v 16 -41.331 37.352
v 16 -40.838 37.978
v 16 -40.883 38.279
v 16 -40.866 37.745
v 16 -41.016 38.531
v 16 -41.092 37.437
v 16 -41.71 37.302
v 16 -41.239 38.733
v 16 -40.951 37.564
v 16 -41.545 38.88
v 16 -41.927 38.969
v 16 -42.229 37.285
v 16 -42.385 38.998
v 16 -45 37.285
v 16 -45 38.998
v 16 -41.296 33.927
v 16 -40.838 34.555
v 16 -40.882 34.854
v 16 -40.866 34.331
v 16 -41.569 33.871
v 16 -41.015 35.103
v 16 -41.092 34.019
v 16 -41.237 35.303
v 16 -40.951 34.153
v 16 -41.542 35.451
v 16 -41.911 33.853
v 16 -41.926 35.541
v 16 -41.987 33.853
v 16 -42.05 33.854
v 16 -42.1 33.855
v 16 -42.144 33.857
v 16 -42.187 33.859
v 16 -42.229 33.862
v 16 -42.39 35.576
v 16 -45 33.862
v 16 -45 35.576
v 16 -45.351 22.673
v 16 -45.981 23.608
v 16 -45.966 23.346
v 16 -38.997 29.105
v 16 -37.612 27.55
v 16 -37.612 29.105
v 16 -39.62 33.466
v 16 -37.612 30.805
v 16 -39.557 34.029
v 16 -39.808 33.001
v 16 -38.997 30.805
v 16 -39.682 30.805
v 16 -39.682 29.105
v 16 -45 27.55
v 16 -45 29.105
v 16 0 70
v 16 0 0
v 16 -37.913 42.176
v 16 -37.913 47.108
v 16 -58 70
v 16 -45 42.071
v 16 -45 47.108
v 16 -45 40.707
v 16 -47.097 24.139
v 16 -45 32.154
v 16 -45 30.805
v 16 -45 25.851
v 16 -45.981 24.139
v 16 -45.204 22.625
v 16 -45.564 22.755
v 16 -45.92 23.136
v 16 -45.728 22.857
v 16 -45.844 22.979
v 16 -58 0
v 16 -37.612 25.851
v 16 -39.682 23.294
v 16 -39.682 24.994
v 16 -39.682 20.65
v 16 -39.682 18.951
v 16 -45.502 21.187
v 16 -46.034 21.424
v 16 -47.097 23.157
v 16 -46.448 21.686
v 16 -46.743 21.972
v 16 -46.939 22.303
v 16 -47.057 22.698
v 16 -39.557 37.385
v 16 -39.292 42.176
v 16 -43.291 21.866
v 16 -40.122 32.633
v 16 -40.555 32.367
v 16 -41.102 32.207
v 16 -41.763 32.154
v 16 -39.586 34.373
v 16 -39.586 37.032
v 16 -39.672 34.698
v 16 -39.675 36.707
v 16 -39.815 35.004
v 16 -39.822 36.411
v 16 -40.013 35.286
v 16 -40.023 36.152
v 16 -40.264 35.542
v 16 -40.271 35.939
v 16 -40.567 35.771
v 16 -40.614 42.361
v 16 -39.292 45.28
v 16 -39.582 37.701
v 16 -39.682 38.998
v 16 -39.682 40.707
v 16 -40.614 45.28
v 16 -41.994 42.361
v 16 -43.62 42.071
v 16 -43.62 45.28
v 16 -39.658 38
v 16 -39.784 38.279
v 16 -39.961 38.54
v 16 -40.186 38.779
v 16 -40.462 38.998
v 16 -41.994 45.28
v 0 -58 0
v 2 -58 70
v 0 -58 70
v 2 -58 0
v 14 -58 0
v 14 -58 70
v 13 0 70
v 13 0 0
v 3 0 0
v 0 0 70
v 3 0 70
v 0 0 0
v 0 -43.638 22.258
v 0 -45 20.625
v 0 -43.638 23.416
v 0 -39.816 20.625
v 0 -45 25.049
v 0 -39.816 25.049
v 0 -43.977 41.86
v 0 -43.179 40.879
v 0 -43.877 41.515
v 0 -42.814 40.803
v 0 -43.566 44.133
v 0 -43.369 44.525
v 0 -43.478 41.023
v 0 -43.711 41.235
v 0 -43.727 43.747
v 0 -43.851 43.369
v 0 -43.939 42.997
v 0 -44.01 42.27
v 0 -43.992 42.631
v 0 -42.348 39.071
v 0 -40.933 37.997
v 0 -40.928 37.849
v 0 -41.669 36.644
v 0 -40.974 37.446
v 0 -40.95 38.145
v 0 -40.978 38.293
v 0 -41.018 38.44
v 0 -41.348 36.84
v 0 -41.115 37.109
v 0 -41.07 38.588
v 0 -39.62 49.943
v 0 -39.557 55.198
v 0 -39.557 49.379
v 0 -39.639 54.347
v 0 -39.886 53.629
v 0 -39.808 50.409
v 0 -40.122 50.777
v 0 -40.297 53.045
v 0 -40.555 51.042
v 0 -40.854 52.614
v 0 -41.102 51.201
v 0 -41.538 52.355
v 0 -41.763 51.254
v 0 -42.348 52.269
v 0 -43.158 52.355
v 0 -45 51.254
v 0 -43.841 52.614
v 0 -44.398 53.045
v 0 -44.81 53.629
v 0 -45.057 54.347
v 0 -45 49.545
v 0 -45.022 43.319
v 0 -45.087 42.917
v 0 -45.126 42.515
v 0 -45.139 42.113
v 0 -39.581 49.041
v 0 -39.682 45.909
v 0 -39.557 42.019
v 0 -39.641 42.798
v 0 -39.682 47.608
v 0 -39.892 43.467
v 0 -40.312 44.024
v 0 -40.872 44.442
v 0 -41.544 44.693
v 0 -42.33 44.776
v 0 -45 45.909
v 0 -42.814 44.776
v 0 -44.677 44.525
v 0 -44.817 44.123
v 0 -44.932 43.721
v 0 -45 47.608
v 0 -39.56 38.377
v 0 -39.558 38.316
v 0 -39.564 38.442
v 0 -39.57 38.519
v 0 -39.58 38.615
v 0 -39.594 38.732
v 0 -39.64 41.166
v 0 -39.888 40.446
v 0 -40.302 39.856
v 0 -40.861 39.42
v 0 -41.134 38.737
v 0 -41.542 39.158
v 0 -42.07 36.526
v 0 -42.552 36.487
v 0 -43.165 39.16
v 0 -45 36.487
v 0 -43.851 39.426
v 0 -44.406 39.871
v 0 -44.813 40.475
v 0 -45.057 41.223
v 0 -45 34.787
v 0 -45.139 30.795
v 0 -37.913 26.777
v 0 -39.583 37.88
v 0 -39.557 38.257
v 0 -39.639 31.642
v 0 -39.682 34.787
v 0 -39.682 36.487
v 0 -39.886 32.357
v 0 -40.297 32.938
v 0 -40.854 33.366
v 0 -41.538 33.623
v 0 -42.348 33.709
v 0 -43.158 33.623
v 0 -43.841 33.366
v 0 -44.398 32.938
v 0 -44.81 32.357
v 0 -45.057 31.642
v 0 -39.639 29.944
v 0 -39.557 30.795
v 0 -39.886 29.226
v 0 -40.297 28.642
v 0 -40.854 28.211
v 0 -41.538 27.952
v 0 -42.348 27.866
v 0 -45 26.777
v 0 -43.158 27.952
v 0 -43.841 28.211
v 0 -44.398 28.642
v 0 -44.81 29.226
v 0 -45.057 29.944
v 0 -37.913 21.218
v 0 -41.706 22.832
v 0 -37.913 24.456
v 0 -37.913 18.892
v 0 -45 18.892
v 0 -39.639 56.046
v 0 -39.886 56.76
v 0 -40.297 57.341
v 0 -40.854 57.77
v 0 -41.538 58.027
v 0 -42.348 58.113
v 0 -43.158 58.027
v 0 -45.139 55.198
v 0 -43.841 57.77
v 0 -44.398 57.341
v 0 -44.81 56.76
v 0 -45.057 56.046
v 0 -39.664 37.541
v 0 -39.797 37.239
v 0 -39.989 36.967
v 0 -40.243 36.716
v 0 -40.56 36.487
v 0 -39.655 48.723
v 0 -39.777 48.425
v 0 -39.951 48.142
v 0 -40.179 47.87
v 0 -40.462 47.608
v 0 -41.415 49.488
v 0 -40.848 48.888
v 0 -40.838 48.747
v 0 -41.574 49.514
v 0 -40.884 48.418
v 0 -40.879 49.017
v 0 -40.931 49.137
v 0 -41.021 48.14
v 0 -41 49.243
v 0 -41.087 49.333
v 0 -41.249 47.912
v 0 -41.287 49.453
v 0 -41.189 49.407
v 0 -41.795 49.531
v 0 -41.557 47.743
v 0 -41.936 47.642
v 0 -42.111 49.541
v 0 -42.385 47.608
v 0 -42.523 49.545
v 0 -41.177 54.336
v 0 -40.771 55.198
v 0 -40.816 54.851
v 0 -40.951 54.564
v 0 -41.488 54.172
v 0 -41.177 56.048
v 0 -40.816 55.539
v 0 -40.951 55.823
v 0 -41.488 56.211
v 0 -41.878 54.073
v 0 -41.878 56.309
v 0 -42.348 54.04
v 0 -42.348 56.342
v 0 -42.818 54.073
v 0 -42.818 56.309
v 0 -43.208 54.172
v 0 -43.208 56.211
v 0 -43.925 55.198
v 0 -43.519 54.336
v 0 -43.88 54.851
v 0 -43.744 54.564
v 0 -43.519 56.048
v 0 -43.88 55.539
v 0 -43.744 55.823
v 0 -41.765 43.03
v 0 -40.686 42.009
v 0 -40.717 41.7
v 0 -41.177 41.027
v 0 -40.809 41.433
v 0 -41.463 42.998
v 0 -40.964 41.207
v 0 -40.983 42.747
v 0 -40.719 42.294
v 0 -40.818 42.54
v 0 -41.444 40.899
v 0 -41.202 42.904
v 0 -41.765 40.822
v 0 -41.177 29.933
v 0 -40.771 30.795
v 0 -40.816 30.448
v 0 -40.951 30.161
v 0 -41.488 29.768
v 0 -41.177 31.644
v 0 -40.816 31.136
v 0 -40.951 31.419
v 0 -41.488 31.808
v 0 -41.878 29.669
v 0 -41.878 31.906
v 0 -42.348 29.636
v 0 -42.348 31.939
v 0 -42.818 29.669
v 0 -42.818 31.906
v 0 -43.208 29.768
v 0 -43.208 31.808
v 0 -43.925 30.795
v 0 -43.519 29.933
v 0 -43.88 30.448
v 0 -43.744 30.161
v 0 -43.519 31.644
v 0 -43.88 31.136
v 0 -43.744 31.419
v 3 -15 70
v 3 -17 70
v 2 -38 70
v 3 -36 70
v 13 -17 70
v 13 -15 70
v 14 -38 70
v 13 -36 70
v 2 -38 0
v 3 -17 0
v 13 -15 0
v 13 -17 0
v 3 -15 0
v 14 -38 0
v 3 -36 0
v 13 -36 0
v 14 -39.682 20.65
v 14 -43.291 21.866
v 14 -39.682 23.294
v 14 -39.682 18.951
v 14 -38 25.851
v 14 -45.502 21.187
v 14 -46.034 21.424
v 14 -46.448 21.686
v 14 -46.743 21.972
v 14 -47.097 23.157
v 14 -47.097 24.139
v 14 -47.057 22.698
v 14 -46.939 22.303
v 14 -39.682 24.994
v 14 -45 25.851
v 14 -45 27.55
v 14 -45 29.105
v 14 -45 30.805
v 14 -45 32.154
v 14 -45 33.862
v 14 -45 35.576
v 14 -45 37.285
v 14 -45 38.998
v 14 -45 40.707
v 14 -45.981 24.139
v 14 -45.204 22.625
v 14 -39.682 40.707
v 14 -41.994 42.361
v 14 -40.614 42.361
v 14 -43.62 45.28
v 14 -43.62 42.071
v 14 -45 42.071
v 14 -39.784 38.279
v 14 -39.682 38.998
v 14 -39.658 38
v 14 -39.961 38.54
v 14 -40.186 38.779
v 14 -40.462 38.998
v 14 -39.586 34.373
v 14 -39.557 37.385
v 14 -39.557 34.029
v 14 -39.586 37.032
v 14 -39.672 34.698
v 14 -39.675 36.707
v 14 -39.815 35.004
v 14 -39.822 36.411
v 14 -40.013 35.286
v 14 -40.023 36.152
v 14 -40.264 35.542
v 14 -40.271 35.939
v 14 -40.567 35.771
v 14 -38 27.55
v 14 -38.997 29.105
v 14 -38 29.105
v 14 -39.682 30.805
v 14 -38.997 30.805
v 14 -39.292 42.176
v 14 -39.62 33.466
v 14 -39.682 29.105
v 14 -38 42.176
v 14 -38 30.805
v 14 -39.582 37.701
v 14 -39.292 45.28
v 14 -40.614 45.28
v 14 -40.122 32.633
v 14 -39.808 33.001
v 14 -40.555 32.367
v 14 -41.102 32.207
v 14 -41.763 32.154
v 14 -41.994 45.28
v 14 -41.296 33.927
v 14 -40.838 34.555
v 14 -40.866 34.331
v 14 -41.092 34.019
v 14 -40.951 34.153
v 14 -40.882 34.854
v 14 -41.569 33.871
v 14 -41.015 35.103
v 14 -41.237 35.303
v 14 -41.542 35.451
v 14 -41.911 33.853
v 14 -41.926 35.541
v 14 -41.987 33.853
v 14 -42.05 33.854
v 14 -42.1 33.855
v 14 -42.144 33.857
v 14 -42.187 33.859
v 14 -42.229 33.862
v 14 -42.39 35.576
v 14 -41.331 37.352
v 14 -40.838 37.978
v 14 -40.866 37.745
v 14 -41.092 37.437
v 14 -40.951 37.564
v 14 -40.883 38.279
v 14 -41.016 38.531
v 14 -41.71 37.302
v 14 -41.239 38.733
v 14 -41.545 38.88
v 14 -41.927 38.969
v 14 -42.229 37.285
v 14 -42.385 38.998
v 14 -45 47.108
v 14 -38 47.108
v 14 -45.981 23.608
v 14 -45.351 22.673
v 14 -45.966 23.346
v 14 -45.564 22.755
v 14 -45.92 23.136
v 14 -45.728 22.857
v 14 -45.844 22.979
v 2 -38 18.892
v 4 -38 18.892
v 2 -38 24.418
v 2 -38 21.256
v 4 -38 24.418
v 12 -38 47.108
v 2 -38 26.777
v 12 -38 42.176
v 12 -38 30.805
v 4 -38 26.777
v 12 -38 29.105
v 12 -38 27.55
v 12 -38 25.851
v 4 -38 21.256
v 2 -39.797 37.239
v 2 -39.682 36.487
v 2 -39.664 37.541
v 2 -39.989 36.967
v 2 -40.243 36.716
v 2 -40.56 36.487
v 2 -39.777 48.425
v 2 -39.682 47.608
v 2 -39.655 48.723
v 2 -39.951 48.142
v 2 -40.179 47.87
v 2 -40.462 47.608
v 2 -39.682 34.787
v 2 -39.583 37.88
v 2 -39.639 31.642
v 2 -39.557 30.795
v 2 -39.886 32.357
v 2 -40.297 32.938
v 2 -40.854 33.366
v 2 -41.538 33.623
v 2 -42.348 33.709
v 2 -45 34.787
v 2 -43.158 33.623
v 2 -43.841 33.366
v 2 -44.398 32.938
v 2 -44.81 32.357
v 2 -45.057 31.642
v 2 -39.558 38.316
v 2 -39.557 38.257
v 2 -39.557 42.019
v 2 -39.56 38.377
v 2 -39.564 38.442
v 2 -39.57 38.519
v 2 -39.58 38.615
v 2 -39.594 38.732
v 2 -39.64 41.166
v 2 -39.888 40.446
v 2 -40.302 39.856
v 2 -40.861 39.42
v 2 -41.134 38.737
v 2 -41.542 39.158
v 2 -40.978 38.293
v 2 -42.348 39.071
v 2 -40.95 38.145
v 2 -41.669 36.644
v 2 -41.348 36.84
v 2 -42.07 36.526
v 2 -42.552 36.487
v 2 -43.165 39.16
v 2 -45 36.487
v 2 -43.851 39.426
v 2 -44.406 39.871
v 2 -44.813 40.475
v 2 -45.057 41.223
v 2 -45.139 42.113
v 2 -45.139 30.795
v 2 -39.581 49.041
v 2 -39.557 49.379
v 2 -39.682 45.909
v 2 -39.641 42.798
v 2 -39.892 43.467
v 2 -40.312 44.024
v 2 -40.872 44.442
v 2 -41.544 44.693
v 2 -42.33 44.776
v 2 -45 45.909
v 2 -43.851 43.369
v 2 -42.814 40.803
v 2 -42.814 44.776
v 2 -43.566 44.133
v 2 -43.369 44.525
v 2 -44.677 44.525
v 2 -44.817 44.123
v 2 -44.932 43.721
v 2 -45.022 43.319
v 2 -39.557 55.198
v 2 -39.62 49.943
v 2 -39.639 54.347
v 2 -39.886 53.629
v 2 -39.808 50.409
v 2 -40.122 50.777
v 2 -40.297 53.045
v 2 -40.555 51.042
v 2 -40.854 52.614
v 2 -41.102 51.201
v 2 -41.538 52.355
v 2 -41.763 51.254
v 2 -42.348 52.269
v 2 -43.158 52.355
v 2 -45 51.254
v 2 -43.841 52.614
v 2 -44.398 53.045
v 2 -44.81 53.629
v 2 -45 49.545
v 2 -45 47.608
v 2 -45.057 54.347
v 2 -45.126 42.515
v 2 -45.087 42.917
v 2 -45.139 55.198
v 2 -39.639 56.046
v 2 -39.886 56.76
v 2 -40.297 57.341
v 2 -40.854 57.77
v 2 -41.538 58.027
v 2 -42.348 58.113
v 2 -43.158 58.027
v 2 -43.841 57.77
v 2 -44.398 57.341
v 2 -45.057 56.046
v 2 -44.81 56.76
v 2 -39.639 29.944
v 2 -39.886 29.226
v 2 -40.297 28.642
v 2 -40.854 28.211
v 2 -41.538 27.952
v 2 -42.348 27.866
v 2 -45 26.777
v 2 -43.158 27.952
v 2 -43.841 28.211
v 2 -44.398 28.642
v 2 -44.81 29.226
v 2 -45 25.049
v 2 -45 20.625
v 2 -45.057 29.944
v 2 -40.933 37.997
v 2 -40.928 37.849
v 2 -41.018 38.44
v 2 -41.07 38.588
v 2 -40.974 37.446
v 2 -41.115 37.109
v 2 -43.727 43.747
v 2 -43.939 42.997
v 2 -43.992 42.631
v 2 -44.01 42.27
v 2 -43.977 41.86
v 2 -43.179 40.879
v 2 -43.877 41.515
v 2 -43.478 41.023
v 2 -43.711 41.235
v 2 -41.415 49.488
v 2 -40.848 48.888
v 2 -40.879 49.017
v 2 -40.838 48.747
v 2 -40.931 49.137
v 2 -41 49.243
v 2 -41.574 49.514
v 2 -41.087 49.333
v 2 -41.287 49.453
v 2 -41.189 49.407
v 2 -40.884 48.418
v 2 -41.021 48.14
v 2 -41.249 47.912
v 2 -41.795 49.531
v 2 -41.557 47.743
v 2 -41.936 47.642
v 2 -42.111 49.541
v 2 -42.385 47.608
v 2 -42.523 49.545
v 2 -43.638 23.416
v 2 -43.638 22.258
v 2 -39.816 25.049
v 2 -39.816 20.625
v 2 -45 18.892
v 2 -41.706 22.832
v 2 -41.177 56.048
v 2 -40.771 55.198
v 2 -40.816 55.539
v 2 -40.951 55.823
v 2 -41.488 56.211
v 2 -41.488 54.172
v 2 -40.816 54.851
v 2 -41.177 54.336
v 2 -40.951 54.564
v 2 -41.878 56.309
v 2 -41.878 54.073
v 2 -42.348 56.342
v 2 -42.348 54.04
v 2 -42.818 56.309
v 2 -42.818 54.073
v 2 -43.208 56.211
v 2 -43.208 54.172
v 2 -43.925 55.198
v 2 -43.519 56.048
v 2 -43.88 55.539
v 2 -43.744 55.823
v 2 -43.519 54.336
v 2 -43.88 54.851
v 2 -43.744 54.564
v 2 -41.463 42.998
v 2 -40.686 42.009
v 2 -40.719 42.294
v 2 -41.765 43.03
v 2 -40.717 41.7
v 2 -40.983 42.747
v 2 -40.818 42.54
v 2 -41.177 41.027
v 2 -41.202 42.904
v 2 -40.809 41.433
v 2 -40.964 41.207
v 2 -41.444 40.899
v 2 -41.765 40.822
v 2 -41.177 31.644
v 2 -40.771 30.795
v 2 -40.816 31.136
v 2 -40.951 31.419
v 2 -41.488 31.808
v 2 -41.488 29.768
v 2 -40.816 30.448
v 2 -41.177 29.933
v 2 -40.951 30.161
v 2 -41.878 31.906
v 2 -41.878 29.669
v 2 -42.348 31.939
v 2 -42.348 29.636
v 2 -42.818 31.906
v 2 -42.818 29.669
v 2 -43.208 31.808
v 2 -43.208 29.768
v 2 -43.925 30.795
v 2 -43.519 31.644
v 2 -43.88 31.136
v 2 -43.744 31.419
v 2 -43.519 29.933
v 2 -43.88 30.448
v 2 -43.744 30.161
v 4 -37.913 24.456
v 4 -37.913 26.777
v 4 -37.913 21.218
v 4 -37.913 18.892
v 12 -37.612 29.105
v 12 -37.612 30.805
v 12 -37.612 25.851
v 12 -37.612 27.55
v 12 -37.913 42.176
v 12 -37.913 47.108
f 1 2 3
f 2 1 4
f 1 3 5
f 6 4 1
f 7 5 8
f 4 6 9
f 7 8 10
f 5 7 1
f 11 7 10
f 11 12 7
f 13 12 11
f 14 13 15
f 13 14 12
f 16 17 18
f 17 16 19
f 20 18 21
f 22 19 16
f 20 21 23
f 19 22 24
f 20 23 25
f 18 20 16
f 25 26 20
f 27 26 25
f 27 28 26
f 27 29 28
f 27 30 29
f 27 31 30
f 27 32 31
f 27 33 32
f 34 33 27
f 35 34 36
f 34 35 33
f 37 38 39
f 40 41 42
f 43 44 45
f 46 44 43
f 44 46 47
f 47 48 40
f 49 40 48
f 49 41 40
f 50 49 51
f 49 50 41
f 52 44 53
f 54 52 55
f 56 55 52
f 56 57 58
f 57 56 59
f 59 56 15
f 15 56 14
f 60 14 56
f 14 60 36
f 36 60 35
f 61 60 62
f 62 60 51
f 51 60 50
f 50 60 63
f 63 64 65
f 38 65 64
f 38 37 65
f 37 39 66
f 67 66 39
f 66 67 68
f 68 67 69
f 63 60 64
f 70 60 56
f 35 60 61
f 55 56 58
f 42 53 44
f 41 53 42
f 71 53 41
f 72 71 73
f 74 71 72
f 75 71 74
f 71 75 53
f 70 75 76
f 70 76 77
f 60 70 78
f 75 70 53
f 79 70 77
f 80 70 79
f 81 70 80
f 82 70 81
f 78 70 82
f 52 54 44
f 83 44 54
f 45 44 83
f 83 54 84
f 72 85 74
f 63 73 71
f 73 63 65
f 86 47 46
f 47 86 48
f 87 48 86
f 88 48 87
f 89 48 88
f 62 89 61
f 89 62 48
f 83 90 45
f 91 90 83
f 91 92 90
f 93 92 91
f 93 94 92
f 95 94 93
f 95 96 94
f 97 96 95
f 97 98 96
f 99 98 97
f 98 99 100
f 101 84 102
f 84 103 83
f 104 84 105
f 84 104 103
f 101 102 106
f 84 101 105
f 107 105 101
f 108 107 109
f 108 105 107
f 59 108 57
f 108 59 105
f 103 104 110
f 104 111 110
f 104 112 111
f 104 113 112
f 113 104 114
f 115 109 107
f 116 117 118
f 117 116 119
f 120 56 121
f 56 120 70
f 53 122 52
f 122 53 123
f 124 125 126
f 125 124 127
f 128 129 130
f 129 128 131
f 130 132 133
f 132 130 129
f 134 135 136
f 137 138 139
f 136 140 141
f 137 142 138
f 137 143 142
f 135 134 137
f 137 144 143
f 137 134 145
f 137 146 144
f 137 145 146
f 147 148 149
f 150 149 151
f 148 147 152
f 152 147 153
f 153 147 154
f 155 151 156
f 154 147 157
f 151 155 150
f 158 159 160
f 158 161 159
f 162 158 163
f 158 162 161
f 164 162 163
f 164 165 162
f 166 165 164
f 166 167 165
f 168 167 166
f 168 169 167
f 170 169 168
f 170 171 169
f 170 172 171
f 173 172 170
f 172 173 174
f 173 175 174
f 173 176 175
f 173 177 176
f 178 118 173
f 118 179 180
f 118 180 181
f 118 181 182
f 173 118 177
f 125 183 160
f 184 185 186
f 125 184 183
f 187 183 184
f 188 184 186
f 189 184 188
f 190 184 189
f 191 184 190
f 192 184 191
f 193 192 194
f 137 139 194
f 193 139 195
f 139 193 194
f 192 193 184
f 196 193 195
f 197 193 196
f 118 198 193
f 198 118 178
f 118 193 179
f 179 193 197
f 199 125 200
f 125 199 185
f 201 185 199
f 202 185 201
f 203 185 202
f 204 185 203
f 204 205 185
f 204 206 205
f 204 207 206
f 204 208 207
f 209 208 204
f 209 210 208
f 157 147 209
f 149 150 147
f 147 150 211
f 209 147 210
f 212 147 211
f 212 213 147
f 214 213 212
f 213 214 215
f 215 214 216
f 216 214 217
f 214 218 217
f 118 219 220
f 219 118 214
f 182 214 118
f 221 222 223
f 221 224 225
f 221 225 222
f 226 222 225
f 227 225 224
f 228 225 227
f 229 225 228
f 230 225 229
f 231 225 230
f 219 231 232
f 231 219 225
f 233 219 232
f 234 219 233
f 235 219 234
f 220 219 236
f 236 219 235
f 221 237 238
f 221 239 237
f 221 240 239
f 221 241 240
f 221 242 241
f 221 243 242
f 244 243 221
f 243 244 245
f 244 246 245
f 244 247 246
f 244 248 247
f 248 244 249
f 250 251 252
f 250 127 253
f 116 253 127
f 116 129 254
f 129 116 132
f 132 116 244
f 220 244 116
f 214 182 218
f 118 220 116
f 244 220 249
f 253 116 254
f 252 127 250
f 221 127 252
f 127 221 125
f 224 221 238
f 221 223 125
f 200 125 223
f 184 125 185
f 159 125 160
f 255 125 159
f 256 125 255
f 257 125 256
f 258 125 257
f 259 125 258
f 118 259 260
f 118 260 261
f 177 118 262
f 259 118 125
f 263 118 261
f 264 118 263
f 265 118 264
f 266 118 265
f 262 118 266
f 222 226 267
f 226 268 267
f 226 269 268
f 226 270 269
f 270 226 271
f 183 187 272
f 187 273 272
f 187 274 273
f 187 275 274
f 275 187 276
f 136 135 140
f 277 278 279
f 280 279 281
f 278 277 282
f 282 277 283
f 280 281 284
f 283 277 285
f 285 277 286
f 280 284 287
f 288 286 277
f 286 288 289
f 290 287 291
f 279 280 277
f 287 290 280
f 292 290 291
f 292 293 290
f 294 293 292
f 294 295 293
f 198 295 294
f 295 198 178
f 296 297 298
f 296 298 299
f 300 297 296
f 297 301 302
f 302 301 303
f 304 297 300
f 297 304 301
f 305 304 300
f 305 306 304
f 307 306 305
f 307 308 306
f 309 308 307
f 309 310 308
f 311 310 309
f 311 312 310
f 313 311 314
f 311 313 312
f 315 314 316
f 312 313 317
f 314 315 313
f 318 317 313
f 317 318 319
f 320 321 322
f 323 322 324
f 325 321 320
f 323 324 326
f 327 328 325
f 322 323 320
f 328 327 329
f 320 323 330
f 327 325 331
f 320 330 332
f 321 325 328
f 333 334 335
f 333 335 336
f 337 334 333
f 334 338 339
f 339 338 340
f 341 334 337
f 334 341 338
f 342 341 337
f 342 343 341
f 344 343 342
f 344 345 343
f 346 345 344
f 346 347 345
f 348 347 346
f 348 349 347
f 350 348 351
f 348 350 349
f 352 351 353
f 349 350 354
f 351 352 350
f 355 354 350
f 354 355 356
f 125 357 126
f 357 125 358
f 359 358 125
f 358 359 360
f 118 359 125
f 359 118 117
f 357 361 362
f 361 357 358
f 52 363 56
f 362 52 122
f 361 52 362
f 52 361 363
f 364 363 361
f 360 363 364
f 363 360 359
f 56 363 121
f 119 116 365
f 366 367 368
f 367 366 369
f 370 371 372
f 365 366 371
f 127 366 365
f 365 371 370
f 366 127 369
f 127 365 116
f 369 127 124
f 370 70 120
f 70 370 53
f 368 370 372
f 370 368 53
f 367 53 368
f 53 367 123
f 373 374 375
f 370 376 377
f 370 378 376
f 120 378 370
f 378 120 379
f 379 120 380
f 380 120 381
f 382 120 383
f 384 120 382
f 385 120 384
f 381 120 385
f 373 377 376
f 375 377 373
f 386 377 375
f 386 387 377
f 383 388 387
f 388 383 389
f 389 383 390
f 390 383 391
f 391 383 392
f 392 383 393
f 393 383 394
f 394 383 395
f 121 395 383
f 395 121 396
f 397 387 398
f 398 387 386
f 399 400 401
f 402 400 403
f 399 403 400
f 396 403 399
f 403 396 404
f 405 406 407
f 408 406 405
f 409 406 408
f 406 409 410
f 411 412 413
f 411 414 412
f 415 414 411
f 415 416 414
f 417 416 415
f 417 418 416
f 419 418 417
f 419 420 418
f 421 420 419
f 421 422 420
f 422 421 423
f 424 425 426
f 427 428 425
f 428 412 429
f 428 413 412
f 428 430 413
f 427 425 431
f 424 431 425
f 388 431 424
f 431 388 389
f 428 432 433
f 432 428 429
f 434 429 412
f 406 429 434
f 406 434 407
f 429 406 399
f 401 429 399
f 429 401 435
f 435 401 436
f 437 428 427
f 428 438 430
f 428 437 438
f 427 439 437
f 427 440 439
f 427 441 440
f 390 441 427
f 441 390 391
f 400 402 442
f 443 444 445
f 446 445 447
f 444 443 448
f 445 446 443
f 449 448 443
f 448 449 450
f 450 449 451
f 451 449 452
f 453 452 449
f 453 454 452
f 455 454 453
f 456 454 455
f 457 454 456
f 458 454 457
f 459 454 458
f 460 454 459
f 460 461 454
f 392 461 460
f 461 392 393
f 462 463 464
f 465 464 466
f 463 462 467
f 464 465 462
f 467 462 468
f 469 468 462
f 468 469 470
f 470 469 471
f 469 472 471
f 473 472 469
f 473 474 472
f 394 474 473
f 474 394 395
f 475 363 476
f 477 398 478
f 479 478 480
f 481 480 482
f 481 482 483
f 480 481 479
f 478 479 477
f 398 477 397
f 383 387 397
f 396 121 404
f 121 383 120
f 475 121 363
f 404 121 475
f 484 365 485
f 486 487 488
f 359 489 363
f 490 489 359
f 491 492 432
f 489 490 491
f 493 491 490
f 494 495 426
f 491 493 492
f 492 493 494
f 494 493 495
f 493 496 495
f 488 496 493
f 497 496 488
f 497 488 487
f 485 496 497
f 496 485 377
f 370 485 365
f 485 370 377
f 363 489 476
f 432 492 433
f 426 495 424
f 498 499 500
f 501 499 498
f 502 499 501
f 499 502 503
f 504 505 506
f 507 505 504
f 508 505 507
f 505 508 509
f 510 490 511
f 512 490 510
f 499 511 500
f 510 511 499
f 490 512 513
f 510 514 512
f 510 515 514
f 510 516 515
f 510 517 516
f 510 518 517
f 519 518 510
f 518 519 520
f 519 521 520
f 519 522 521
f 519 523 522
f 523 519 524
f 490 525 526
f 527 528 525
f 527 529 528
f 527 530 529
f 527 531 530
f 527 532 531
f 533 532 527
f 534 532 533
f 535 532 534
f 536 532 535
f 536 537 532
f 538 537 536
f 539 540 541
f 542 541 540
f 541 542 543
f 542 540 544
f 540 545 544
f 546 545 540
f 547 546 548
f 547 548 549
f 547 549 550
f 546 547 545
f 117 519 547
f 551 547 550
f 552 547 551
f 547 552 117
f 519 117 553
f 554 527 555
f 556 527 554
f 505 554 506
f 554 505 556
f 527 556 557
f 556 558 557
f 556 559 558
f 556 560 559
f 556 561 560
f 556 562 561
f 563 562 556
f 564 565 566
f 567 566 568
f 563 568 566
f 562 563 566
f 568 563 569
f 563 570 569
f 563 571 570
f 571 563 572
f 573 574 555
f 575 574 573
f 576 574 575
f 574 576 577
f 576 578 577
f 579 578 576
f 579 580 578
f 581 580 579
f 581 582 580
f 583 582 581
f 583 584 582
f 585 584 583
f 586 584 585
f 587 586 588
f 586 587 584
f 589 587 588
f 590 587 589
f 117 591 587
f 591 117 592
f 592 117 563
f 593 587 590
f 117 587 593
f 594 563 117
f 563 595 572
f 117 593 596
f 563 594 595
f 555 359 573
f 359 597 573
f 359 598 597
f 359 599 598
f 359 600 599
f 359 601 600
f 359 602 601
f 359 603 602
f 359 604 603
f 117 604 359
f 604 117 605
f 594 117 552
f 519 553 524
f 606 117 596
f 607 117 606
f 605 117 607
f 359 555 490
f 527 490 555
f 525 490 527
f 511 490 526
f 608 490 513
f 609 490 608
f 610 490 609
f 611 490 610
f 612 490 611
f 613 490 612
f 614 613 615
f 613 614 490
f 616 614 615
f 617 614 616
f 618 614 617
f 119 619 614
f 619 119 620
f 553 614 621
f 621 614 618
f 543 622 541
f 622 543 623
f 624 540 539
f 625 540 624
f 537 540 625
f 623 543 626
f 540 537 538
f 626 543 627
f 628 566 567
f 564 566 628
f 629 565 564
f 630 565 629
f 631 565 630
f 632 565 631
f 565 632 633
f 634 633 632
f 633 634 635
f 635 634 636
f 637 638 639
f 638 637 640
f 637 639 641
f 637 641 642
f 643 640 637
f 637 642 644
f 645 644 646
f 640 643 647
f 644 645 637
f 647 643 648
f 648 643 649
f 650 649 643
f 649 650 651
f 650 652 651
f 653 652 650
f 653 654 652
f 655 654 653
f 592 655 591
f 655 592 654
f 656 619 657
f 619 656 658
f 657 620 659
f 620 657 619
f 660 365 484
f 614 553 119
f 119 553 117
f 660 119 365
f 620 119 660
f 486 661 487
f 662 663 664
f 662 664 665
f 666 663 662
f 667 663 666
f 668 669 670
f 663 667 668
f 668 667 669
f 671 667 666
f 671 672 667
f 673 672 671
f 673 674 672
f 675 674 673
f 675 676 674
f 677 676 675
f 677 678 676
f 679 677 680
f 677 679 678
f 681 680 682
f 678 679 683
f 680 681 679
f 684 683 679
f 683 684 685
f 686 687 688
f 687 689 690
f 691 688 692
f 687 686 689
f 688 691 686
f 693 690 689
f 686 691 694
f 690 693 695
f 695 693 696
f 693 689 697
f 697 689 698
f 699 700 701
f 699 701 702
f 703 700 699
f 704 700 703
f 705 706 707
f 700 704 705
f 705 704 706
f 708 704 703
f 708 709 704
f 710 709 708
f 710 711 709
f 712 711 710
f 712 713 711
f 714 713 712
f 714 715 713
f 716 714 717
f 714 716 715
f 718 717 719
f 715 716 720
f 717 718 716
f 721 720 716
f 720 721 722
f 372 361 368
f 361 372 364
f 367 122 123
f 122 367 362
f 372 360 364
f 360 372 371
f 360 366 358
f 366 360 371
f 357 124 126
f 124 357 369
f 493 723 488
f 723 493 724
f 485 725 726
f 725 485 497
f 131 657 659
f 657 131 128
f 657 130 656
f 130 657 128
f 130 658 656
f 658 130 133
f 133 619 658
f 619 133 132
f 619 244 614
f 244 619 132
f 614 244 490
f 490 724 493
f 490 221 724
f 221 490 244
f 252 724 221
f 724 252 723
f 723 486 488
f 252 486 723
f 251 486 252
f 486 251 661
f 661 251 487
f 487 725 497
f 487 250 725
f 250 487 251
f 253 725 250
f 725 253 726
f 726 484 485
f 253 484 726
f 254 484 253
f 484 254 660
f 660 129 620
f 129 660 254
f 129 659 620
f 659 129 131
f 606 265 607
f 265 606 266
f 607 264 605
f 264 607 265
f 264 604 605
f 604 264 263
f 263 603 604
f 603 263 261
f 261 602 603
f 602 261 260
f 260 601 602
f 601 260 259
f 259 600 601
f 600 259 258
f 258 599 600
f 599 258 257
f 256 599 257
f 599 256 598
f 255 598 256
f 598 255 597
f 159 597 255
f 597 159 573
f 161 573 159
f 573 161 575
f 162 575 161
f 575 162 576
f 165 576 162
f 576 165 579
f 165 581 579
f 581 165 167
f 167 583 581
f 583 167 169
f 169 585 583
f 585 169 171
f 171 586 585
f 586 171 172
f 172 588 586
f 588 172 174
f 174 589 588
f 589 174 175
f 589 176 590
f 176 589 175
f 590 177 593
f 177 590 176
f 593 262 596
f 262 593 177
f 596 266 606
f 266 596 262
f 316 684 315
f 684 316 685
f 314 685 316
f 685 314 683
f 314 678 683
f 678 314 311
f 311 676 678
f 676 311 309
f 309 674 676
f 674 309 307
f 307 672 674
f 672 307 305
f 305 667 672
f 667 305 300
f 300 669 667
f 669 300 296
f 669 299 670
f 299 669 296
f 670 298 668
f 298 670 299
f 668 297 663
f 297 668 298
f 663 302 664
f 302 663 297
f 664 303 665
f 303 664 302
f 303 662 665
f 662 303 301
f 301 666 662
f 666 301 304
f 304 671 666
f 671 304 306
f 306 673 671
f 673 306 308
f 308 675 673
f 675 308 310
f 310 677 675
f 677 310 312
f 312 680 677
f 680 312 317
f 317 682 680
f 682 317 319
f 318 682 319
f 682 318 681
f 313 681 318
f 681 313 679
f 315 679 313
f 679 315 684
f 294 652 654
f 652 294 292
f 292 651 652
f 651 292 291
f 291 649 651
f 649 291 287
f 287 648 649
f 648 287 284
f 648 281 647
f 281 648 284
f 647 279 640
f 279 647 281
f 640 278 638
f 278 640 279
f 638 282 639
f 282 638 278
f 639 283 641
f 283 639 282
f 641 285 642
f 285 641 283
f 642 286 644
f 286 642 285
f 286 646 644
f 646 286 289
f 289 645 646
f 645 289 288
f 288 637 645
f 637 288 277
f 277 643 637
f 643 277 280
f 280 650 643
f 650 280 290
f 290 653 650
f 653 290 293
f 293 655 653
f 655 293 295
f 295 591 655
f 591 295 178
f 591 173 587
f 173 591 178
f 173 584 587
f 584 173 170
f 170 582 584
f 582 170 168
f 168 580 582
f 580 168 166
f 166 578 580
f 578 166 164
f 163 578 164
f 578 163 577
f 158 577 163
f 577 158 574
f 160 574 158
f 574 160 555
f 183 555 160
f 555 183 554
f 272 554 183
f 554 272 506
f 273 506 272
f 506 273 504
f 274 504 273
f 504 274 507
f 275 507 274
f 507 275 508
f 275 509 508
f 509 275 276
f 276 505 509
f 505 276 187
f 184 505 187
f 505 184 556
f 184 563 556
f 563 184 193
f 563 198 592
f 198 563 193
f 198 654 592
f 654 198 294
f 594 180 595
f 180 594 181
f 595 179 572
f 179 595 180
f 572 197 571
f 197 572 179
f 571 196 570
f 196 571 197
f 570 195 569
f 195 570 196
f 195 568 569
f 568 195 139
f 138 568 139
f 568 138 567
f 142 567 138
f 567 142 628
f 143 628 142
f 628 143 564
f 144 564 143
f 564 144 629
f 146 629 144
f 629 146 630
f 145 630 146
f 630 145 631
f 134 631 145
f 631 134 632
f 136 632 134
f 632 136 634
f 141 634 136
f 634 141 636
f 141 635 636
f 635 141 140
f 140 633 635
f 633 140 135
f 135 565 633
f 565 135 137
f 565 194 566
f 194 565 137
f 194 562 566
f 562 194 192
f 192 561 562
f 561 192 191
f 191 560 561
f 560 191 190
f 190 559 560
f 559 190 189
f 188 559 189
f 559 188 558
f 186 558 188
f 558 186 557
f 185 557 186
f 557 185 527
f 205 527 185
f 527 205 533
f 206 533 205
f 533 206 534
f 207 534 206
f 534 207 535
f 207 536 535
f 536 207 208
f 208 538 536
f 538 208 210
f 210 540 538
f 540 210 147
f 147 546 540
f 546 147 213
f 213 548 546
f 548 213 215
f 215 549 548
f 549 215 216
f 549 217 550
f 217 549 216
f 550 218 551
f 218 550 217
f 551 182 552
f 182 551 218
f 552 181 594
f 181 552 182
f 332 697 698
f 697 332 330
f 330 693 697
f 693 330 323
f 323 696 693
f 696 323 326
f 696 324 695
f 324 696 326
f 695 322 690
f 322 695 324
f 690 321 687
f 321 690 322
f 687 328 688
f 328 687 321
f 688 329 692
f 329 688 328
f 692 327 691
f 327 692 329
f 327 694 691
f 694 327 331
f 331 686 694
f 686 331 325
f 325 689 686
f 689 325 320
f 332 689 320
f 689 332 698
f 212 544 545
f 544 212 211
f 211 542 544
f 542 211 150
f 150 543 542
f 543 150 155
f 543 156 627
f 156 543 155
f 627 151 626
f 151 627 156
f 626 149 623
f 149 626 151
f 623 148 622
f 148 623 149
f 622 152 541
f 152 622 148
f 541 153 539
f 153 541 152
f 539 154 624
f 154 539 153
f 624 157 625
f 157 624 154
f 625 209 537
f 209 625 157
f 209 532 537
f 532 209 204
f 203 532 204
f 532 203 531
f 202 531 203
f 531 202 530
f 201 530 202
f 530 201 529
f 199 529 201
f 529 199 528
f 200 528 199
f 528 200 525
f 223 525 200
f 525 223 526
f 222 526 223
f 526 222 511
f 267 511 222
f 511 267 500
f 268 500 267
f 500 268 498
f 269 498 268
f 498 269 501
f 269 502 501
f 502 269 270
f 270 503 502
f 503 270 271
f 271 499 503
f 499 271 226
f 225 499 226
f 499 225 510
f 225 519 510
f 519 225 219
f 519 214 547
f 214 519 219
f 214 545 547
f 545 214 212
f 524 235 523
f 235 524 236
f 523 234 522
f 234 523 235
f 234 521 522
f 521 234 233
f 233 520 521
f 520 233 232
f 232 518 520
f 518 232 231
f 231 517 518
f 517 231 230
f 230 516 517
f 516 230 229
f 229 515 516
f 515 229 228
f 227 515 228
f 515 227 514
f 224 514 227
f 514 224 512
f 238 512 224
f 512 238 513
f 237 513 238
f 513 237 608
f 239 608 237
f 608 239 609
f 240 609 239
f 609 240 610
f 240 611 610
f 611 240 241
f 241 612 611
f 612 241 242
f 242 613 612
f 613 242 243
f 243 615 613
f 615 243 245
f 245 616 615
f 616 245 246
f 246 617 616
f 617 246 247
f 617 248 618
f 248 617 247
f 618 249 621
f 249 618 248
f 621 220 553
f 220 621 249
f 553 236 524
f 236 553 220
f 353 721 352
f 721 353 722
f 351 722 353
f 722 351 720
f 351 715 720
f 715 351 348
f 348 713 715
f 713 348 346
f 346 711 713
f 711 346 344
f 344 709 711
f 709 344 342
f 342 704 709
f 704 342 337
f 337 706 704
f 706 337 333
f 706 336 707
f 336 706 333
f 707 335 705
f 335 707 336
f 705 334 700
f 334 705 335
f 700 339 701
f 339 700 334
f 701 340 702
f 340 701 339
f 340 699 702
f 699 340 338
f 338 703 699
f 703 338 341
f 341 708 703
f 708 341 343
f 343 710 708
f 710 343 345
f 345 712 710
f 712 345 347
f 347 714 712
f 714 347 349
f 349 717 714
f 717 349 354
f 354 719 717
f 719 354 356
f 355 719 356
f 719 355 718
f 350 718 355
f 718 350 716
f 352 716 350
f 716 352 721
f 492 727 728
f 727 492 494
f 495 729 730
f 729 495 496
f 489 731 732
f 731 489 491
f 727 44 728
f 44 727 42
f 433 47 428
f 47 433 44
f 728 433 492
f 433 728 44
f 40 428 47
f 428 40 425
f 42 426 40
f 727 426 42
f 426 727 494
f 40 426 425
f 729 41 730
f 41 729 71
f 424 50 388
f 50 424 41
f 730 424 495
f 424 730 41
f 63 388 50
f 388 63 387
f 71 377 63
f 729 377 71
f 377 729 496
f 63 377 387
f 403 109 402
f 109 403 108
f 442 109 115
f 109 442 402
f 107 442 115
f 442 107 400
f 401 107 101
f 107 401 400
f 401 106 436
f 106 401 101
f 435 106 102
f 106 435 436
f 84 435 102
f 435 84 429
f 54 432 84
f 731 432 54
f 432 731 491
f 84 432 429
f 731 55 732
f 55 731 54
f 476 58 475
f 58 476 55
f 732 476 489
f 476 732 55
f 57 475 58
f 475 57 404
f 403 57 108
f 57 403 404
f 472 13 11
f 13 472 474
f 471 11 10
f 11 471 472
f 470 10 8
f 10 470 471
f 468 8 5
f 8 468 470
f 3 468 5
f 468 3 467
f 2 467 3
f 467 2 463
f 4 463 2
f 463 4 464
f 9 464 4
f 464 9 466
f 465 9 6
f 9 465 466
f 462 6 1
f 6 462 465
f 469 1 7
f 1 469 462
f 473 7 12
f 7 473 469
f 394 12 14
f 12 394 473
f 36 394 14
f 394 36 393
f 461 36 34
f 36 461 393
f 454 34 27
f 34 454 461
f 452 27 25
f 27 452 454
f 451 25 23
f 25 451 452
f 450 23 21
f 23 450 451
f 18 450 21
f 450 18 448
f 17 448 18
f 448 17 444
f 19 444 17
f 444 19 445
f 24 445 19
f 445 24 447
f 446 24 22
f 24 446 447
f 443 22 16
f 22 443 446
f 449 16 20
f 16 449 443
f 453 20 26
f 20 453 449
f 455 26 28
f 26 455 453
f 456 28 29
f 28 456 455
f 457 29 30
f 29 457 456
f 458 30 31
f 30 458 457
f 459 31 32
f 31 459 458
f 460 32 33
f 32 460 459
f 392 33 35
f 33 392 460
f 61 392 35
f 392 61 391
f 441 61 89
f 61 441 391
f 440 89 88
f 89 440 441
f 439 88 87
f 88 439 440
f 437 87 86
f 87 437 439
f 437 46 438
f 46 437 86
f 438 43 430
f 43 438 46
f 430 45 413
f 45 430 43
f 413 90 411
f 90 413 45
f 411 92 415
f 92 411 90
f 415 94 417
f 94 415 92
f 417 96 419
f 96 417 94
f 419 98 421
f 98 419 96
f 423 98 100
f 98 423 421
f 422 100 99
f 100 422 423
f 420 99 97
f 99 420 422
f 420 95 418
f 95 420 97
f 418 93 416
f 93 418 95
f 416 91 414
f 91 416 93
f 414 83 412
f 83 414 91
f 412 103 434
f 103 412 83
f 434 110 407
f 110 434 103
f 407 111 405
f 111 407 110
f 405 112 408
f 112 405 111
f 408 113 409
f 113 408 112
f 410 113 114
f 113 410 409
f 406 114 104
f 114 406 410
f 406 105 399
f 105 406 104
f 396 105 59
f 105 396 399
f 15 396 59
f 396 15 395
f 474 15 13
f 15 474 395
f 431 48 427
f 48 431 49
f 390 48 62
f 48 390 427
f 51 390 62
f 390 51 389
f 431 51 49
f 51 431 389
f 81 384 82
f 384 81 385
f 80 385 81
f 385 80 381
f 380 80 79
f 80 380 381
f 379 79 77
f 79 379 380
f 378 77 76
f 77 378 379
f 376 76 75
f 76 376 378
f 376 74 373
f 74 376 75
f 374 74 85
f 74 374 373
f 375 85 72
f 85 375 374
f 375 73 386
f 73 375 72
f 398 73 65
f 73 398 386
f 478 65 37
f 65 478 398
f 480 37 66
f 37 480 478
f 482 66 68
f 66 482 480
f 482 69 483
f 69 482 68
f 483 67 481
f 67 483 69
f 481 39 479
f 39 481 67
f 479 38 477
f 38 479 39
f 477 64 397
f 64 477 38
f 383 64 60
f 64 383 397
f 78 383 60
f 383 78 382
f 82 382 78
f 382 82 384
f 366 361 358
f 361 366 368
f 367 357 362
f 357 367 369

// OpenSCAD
/*
 * Handy holder for the top of a display (C) by Tobias Wilken
 */

length = 70;
monitor_width = 12;
monitor_height = 20;
mobile_width = 10;
mobile_height = 36; //15 + 21
thickness=2;
rotate([90, 0, 0]) {
difference() {
    cube([monitor_width + 2 * thickness, length, monitor_height + mobile_height + thickness]);
    // monitor
    translate([thickness, 0, mobile_height + thickness]) cube([monitor_width, length, monitor_height]);
    // mobile
    translate([(monitor_width + 2 * thickness - mobile_width) / 2, 0, 0]) cube([mobile_width, length, mobile_height]);
     translate([2 * thickness, 18, 45]) rotate([-90, 0,  90]) linear_extrude(3 * thickness) text("Moreno", size=7, font="CutOutsFLF:style=Bold");
    //translate([2 * thickness, 18, 48]) rotate([-90, 0,  90]) linear_extrude(3 * thickness) text("Master", size=7, font="CutOutsFLF:style=Bold");
    translate([monitor_width, length -22, 45]) rotate([-90, 0,  -90]) linear_extrude(3 * thickness) text("Emily", size=7, font="CutOutsFLF:style=Bold");
    //translate([monitor_width, length -8, 26]) rotate([-90, 0,  -90]) linear_extrude(3 * thickness) text("Accelerator", size=7, font="CutOutsFLF:style=Bold");
}
translate([0, 0, 15]) cube([monitor_width + 2 * thickness, length, thickness]);
}
